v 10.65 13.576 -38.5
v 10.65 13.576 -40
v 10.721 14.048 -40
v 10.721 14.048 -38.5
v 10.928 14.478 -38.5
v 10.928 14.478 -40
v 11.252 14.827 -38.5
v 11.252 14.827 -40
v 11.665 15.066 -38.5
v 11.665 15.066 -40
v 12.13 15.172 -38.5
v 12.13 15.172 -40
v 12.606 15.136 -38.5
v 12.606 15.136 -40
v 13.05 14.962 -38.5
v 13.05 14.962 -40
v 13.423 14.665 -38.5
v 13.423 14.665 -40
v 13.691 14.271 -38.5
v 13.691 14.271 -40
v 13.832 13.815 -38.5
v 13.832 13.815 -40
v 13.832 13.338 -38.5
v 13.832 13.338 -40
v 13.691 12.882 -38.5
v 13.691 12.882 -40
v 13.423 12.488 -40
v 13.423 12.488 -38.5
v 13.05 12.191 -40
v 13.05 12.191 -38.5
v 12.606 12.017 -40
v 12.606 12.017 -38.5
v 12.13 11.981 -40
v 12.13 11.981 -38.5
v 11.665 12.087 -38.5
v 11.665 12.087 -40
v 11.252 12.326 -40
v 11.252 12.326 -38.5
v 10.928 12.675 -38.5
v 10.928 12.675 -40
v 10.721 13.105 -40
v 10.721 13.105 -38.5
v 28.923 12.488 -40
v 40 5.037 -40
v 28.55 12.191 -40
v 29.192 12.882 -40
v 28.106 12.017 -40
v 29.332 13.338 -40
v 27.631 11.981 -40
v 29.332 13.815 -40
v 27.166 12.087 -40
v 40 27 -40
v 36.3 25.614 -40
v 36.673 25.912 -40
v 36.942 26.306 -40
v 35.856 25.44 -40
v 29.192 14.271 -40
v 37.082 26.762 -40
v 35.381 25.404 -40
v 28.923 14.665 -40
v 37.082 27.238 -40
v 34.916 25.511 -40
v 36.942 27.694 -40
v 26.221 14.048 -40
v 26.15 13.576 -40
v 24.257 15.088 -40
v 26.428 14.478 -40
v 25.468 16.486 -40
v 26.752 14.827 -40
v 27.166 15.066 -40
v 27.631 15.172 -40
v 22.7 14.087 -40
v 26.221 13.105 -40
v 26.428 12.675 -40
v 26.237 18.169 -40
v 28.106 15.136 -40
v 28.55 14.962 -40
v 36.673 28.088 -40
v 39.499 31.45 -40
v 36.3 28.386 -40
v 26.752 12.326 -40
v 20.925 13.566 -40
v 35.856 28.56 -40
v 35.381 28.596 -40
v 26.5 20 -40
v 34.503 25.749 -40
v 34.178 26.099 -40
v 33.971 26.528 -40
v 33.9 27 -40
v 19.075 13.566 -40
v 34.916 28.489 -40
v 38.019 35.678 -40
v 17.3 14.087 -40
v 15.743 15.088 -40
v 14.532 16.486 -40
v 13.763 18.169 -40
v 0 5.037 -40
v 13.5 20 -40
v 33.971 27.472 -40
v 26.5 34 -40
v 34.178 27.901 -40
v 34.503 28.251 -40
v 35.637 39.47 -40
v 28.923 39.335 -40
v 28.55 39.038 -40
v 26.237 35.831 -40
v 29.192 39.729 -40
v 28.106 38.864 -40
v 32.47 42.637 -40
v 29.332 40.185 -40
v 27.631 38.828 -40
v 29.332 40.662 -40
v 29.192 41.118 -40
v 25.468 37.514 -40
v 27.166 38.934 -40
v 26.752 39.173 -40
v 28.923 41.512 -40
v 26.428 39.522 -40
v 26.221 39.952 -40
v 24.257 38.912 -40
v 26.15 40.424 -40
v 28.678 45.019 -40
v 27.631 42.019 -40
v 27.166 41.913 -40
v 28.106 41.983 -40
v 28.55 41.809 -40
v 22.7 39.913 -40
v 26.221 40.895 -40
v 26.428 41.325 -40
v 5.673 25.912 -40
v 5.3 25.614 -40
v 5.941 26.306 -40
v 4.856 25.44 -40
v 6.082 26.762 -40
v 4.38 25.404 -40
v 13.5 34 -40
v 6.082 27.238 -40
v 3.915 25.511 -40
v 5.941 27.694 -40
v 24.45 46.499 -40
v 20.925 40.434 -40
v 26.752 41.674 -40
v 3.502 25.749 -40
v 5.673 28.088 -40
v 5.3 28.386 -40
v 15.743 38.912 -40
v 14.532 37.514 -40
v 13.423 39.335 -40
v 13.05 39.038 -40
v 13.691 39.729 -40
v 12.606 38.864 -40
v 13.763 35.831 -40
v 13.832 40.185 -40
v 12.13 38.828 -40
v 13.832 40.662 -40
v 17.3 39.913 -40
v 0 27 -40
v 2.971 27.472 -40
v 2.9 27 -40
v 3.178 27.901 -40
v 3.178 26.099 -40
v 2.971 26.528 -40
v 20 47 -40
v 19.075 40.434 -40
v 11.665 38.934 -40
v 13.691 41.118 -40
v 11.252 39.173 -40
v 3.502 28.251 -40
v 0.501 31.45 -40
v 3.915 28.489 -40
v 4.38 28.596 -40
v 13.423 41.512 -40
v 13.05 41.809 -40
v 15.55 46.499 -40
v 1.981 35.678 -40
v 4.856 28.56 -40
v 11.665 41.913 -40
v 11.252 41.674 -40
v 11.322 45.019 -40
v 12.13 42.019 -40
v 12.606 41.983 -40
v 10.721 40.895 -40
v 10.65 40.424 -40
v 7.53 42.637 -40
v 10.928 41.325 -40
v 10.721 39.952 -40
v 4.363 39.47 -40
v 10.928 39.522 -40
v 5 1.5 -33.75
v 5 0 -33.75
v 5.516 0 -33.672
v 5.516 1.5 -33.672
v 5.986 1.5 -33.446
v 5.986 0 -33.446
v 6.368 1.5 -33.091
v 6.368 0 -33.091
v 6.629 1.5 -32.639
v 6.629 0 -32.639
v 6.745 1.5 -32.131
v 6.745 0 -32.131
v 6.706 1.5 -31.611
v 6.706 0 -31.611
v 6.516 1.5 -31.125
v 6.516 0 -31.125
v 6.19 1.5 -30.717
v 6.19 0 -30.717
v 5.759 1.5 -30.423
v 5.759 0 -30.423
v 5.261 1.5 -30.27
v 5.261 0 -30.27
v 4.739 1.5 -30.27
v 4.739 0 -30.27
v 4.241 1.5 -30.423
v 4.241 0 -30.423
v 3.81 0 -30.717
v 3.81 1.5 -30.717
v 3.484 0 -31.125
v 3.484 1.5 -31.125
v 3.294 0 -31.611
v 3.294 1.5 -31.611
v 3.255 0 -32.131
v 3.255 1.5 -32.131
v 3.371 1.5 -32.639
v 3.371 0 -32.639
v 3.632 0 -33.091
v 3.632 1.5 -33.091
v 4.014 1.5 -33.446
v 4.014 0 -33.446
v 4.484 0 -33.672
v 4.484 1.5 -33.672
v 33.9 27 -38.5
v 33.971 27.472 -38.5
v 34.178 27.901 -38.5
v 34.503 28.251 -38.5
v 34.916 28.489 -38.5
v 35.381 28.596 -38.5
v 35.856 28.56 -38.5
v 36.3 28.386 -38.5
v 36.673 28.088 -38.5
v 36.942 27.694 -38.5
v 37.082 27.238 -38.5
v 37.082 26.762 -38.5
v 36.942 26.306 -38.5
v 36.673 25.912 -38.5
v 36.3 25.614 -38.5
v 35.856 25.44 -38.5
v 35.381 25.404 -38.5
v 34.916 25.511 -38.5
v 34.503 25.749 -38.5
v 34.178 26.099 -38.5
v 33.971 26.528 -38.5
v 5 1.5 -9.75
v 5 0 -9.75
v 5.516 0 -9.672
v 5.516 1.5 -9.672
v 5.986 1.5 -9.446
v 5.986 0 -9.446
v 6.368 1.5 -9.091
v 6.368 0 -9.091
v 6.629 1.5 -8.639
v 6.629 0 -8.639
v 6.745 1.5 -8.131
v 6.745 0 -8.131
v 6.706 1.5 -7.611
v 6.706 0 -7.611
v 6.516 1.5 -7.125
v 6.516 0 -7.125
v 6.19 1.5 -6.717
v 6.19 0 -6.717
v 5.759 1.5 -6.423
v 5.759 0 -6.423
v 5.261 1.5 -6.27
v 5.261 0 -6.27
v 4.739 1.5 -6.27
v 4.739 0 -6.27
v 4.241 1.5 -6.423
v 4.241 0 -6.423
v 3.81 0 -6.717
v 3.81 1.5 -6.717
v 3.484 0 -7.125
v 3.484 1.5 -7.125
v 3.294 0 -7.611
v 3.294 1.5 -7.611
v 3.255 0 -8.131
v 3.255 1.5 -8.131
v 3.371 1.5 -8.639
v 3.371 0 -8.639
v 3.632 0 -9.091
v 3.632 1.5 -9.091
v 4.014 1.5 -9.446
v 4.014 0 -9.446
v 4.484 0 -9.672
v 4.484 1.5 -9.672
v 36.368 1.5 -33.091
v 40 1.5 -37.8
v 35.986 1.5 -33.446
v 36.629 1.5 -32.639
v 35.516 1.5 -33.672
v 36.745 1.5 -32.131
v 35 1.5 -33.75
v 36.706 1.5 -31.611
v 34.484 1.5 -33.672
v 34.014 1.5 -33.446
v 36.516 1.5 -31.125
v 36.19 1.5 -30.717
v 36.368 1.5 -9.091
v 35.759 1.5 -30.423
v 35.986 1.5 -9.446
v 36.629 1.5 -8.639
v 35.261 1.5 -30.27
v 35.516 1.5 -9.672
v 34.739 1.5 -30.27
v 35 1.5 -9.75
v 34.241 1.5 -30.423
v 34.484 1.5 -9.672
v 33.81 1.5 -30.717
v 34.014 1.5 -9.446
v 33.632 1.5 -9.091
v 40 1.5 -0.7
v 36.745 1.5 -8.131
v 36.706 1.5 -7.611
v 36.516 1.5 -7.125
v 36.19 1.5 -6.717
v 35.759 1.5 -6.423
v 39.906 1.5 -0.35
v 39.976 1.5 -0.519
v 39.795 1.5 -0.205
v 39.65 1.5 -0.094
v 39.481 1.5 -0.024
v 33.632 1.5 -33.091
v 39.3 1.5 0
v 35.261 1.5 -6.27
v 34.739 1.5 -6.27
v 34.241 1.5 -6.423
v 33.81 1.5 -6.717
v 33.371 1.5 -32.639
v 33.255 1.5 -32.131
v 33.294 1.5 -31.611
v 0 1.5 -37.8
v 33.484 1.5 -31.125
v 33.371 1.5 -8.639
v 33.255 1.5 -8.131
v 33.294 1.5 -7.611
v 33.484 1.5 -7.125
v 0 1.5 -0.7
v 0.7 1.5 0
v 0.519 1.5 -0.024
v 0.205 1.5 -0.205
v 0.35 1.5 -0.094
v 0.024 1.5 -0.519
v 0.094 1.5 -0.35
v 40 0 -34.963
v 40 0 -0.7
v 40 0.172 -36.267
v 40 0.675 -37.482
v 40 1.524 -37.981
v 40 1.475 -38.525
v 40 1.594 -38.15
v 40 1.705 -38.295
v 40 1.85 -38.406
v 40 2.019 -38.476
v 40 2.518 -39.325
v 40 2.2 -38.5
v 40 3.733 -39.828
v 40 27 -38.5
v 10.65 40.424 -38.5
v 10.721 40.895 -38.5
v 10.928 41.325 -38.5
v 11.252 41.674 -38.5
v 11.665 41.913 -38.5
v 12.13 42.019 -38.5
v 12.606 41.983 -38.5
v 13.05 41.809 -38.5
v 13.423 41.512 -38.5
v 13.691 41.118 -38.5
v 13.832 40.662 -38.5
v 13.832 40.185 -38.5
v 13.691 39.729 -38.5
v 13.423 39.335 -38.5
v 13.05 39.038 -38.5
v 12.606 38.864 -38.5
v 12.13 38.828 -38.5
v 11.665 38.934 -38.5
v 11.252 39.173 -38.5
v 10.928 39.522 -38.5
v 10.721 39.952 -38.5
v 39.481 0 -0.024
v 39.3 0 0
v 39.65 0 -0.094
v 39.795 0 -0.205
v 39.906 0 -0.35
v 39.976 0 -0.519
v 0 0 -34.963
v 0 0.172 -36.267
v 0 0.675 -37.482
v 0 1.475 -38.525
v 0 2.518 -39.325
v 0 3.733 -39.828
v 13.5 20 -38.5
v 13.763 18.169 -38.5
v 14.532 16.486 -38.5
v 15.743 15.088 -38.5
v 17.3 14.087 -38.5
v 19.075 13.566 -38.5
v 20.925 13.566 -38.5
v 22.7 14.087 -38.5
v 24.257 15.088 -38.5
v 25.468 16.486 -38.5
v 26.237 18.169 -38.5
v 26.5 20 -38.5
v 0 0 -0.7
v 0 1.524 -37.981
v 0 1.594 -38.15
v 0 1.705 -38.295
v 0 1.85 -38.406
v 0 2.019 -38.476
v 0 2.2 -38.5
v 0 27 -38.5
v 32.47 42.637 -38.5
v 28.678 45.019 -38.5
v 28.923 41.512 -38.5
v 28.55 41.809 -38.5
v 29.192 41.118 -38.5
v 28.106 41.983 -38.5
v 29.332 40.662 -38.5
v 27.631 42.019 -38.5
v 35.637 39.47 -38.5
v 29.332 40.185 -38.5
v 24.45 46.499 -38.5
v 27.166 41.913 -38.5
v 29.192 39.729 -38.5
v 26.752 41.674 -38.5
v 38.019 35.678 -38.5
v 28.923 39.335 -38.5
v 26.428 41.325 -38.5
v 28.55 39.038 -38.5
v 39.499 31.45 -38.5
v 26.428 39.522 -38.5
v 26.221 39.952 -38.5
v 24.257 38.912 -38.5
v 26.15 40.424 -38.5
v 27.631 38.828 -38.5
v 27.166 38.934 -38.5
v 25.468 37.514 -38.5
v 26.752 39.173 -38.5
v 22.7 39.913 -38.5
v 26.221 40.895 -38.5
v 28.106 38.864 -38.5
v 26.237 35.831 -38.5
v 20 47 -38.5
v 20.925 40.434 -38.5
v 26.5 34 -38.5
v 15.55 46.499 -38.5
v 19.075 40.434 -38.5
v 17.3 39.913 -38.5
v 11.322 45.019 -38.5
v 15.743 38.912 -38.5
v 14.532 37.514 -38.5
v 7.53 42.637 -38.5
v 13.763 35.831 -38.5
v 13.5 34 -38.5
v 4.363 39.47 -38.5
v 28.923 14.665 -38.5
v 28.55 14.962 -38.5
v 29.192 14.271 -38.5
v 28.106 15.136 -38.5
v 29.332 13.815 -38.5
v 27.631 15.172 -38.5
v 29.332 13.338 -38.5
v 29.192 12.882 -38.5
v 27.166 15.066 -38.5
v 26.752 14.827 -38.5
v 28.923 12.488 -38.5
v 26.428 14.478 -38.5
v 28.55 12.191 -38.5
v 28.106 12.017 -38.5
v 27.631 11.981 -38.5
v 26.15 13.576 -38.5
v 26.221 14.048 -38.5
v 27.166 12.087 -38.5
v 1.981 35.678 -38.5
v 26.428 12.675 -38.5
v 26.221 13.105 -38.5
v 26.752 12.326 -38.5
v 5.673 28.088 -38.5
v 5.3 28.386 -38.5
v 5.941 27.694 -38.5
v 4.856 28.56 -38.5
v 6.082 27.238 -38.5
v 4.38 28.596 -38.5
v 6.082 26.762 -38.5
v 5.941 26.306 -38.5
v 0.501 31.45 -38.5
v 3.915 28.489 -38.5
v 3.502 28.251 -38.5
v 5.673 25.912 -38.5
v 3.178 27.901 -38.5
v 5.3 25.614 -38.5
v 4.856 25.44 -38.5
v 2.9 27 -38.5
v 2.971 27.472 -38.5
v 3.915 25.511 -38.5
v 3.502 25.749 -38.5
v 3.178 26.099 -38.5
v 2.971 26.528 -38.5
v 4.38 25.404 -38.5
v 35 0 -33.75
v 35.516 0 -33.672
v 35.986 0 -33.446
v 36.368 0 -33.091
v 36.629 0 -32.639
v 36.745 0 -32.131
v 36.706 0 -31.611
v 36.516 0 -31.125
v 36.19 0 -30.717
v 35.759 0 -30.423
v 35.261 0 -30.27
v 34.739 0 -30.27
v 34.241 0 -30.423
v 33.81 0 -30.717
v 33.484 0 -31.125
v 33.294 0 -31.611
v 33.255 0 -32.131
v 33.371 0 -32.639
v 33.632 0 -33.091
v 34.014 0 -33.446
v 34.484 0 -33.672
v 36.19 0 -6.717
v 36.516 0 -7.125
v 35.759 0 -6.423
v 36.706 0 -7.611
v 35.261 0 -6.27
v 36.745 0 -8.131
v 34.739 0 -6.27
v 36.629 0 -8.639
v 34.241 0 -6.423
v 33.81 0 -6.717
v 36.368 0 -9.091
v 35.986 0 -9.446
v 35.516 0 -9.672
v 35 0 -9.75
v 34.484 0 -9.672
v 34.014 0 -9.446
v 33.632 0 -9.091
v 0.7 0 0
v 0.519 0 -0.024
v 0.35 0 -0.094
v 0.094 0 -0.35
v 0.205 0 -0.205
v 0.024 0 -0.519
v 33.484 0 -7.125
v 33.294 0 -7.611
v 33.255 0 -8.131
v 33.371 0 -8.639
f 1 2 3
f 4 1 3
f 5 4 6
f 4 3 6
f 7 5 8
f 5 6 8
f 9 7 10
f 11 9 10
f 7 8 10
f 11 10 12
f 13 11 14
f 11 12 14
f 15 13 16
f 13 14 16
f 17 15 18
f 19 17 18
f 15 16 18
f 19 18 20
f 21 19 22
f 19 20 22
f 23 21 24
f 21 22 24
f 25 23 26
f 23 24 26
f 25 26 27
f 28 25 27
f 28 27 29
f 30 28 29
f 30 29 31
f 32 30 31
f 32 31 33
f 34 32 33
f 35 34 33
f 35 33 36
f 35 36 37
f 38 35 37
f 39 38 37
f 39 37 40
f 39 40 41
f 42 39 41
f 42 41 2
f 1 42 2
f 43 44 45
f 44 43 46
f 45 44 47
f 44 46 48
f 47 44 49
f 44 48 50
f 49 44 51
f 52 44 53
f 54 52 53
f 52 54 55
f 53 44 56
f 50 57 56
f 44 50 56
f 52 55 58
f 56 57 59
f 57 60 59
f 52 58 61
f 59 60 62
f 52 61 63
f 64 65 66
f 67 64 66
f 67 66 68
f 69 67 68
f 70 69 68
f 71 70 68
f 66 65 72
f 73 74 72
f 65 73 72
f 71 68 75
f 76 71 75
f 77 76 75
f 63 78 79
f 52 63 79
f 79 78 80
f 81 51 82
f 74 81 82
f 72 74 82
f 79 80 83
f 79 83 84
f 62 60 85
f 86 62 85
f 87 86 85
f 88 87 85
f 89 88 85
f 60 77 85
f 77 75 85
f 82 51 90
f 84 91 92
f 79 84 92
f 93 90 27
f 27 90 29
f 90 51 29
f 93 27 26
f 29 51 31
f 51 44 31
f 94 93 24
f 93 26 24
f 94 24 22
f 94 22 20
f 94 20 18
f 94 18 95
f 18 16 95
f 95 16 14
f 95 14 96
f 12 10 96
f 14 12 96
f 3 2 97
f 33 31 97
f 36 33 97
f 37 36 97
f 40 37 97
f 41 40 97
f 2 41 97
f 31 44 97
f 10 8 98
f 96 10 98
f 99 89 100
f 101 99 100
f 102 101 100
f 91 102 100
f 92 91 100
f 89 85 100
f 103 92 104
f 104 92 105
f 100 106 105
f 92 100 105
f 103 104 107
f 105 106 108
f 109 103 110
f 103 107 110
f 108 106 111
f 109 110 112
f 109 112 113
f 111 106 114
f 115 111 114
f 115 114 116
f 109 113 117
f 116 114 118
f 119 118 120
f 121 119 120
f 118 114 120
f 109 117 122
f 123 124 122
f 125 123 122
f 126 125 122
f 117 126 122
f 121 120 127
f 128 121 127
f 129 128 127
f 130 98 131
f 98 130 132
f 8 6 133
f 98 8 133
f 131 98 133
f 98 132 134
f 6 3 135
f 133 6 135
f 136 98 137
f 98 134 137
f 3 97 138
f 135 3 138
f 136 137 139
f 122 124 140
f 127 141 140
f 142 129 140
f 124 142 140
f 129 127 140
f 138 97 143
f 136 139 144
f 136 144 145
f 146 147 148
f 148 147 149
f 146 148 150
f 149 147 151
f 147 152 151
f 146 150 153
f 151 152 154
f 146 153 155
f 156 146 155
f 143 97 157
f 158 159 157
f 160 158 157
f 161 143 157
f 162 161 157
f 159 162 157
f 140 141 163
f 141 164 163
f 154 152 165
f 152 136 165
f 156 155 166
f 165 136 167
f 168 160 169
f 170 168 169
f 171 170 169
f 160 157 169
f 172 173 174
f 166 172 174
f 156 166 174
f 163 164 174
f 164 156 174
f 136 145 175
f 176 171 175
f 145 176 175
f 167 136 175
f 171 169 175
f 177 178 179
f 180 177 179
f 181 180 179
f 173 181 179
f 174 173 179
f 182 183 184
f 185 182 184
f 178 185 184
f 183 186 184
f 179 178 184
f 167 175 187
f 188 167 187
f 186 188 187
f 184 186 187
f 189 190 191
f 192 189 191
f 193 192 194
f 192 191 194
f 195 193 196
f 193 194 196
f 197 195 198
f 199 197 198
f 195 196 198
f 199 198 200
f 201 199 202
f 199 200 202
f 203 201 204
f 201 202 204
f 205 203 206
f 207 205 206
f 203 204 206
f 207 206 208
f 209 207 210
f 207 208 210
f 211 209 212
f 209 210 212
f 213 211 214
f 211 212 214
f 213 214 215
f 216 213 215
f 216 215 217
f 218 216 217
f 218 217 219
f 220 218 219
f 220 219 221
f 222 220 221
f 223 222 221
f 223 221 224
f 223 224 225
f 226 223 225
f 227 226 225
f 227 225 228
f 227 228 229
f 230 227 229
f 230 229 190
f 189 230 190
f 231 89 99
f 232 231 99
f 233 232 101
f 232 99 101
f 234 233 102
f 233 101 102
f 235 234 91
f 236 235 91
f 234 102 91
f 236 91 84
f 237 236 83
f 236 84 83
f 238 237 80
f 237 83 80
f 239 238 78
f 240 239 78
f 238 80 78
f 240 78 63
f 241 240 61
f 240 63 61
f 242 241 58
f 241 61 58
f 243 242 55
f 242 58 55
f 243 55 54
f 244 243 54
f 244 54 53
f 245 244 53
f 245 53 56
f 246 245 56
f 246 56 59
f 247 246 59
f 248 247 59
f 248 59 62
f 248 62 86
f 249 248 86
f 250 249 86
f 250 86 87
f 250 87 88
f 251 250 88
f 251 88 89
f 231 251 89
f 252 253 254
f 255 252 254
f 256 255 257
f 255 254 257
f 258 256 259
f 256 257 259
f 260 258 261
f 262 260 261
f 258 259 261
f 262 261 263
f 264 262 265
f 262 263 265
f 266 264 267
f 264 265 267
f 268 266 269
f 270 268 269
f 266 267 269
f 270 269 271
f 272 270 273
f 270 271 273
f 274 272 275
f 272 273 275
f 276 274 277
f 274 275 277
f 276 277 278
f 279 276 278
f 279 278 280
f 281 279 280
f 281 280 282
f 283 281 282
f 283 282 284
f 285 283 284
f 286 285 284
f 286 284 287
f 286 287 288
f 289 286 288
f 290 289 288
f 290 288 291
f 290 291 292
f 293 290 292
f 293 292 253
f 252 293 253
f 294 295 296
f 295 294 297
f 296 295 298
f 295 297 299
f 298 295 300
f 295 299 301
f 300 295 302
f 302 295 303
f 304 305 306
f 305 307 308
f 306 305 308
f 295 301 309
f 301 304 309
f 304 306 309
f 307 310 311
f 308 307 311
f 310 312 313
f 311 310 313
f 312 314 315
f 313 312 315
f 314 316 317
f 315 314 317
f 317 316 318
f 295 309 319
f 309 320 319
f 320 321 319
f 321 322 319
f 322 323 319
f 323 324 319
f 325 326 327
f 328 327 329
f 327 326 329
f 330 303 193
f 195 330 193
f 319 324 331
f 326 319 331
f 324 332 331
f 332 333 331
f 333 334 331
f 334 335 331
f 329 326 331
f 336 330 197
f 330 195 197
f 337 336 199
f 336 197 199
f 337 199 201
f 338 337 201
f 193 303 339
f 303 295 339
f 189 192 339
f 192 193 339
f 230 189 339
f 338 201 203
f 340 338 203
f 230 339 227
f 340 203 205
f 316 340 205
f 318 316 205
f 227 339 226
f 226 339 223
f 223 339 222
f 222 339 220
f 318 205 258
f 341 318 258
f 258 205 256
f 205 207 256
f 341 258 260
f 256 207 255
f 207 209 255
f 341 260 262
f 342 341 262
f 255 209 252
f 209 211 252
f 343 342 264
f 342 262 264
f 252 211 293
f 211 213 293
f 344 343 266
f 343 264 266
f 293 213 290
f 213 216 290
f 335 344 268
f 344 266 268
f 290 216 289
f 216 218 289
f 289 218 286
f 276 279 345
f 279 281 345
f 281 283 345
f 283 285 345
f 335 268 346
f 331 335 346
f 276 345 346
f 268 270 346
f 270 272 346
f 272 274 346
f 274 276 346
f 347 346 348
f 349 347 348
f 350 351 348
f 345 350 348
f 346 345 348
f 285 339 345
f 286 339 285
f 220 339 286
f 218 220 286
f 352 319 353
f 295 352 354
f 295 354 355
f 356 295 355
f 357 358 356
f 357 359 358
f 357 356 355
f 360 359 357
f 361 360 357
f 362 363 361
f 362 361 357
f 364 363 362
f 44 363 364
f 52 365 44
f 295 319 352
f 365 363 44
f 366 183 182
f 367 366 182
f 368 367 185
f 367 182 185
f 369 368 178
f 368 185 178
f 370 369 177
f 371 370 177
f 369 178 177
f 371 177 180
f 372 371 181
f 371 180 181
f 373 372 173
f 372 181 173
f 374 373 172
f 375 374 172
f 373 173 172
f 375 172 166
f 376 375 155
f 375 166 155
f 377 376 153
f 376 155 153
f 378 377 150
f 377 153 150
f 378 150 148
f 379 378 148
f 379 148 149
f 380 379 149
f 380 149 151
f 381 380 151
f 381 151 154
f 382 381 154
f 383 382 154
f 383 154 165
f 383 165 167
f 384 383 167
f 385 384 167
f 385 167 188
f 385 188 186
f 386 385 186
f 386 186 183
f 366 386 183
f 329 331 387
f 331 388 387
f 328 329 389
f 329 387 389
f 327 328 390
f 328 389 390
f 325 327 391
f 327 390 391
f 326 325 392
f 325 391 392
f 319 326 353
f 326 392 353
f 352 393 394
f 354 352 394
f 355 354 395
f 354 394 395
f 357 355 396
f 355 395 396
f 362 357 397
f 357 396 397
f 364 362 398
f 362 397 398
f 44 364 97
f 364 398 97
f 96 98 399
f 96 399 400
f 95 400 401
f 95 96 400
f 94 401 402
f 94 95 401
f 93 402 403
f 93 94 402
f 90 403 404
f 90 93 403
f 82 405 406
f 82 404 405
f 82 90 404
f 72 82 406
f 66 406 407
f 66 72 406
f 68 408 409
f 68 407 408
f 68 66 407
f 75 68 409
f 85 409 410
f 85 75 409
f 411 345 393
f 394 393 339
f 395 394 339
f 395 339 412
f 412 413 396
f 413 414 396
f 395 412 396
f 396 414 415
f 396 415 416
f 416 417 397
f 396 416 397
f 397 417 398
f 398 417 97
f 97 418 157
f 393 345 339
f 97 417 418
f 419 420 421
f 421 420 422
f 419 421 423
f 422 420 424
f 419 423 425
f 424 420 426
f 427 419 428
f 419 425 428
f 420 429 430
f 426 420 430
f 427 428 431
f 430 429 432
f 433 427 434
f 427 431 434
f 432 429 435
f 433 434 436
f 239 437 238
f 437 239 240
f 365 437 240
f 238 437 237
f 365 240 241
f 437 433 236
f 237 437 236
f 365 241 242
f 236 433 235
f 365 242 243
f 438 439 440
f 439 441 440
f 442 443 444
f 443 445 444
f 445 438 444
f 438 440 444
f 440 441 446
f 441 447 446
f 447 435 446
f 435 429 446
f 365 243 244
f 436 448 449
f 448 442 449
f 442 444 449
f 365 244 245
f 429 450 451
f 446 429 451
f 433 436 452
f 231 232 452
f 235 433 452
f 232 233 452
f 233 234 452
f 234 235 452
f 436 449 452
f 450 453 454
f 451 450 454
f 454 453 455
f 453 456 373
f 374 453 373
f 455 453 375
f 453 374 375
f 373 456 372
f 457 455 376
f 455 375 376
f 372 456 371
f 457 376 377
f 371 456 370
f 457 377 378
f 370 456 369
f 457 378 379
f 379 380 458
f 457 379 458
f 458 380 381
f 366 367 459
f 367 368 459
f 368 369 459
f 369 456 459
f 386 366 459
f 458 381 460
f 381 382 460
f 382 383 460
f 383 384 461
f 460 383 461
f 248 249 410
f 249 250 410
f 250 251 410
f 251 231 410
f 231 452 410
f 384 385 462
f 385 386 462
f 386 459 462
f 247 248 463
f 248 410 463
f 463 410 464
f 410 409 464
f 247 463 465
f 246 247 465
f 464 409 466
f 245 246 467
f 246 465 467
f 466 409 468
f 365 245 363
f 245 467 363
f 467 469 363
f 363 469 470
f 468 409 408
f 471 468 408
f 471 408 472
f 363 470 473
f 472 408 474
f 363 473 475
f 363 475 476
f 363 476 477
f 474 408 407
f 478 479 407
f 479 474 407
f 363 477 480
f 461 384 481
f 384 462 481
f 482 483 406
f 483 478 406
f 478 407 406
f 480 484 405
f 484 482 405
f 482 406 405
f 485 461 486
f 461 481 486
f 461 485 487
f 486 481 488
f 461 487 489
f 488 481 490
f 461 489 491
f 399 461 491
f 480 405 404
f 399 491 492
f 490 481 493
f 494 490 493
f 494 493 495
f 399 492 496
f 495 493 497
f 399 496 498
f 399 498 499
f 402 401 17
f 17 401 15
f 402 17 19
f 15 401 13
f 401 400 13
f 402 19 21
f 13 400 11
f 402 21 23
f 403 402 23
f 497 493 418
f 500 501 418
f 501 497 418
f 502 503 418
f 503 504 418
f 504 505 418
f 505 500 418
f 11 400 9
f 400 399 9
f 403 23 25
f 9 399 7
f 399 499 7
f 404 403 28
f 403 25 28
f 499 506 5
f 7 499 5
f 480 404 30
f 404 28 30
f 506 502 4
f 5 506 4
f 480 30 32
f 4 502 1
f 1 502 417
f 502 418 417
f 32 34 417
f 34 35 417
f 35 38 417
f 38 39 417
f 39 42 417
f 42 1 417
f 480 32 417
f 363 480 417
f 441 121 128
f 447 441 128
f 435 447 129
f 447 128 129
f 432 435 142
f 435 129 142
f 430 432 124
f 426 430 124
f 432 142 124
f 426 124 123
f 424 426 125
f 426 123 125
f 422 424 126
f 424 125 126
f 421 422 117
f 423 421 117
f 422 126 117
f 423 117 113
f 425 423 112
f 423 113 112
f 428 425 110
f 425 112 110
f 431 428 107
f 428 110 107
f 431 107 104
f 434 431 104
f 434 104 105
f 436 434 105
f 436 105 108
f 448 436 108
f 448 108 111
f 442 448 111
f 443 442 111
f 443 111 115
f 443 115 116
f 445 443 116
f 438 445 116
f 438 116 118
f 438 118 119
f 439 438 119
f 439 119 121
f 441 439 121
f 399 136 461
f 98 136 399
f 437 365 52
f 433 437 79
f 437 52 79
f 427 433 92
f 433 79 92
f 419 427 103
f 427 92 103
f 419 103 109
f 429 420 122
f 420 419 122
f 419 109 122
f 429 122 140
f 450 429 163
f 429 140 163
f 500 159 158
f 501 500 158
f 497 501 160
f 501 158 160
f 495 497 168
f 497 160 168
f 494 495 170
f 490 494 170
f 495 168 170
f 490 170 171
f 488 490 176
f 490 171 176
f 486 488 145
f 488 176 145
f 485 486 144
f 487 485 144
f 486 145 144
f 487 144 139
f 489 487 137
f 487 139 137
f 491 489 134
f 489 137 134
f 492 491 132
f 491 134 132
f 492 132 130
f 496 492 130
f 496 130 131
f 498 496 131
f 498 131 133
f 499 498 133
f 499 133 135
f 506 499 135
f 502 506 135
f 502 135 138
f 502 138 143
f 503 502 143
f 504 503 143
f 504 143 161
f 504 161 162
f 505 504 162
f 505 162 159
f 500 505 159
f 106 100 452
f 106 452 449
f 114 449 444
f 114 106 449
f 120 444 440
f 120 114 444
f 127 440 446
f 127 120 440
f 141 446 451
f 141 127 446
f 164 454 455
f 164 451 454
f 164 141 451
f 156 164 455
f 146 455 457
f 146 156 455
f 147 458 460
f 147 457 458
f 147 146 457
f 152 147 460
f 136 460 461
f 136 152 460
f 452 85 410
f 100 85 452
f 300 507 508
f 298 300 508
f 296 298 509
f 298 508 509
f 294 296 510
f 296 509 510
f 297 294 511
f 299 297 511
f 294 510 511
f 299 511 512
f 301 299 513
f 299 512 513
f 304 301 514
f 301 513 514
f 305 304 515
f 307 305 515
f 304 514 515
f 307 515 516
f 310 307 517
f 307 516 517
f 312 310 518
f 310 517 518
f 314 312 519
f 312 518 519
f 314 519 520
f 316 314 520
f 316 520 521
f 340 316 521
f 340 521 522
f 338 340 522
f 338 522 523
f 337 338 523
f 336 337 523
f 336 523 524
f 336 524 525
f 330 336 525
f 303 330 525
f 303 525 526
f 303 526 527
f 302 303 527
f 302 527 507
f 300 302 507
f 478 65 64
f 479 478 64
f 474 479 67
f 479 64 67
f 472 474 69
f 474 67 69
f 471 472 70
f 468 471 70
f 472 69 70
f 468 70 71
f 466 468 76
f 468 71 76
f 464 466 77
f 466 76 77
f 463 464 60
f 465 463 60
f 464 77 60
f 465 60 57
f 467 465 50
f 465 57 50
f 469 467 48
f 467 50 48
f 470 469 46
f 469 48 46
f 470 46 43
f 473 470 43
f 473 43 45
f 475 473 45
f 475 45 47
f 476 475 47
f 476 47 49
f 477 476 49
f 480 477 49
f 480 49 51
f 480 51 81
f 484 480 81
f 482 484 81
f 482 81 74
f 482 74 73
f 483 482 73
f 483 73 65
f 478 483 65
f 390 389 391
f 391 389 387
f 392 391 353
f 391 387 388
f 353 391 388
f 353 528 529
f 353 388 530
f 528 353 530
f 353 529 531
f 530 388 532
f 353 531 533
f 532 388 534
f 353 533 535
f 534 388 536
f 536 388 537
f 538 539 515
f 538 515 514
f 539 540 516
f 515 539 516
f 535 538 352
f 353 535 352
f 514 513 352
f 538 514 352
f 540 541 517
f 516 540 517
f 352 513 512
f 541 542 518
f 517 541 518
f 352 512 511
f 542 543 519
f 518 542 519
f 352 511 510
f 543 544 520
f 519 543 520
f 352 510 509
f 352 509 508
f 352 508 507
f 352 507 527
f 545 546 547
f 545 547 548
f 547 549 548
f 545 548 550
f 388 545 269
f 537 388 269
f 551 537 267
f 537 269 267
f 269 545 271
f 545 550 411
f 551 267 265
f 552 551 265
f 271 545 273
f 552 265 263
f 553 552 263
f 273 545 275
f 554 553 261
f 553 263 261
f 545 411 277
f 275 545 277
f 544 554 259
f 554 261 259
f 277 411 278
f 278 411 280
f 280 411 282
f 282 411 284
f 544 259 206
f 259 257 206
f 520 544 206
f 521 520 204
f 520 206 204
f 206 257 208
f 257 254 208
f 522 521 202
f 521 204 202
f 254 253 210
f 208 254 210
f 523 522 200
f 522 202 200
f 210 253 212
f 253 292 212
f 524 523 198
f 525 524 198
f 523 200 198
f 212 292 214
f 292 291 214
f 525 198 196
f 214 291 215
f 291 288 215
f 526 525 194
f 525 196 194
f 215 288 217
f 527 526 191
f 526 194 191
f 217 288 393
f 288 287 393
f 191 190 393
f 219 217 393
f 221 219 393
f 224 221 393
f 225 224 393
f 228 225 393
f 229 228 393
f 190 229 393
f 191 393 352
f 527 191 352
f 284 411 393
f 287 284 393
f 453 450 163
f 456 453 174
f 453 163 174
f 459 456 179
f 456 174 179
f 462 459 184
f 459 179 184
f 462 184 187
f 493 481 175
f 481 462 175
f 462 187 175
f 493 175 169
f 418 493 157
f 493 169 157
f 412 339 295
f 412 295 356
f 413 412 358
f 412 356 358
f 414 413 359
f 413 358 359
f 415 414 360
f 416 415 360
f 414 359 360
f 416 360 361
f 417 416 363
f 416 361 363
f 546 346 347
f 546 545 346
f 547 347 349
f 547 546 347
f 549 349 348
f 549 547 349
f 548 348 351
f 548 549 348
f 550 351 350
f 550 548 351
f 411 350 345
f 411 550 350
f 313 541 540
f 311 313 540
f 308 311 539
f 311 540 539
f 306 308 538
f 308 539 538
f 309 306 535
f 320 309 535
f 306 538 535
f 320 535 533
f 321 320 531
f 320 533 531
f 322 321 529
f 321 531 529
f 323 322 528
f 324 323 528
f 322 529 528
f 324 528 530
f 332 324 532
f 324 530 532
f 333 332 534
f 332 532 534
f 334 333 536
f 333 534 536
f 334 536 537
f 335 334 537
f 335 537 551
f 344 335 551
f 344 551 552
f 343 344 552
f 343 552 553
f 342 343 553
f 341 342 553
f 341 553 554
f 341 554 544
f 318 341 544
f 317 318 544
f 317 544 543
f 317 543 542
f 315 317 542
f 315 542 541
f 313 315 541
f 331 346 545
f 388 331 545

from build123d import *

# Parameters (mm, degrees)
MAINPIECE_DEPTH       = 40
CHASSISHOLES_REACH    = 75.546
SKETCH2_R             = 1.75
DOME_REACH            = 75.546
WHEELMOTORGUIDE_REACH = 75.546
SKETCH4_R             = 1.6
FILLET1_R             = 0.7


with BuildPart() as part:
    # Sketch1 → MainPiece (new body)
    with BuildSketch(Plane(origin=(0, 0, 0), x_dir=(0, 0, -1), z_dir=(1, 0, 0))):
        with BuildLine():
            Line((0, 1.5), (0, 0))
            Line((0, 0), (34.963274192, 0))
            ThreePointArc((34.963274192, 0), (38.524777166, 1.475222834), (40, 5.036725808))
            Line((40, 5.036725808), (40, 47))
            Line((40, 47), (38.5, 47))
            Line((38.5, 47), (38.5, 1.5))
            Line((38.5, 1.5), (0, 1.5))
        make_face()
    extrude(amount=MAINPIECE_DEPTH)

    # Sketch2 → ChassisHoles (cut, up to next)
    with BuildSketch(Plane(origin=(0, 0, 0), x_dir=(-1, 0, 0), z_dir=(0, -1, 0)), mode=Mode.PRIVATE) as chassisholes_sk1:
        with Locations(Location((-5, 8, 0), (0, 0, 90))):
            Circle(SKETCH2_R)
    chassisholes_tool1 = extrude(chassisholes_sk1.sketch, amount=-CHASSISHOLES_REACH, mode=Mode.PRIVATE) & part.part
    # Sketch2 → ChassisHoles (cut, up to next)
    with BuildSketch(Plane(origin=(0, 0, 0), x_dir=(-1, 0, 0), z_dir=(0, -1, 0)), mode=Mode.PRIVATE) as chassisholes_sk2:
        with Locations(Location((-35, 8, 0), (0, 0, 90))):
            Circle(SKETCH2_R)
    chassisholes_tool2 = extrude(chassisholes_sk2.sketch, amount=-CHASSISHOLES_REACH, mode=Mode.PRIVATE) & part.part
    # Sketch2 → ChassisHoles (cut, up to next)
    with BuildSketch(Plane(origin=(0, 0, 0), x_dir=(-1, 0, 0), z_dir=(0, -1, 0)), mode=Mode.PRIVATE) as chassisholes_sk3:
        with Locations(Location((-35, 32, 0), (0, 0, 90))):
            Circle(SKETCH2_R)
    chassisholes_tool3 = extrude(chassisholes_sk3.sketch, amount=-CHASSISHOLES_REACH, mode=Mode.PRIVATE) & part.part
    # Sketch2 → ChassisHoles (cut, up to next)
    with BuildSketch(Plane(origin=(0, 0, 0), x_dir=(-1, 0, 0), z_dir=(0, -1, 0)), mode=Mode.PRIVATE) as chassisholes_sk4:
        with Locations(Location((-5, 32, 0), (0, 0, 90))):
            Circle(SKETCH2_R)
    chassisholes_tool4 = extrude(chassisholes_sk4.sketch, amount=-CHASSISHOLES_REACH, mode=Mode.PRIVATE) & part.part
    add(chassisholes_tool1.solids().sort_by_distance((5, 0, -8))[0], mode=Mode.SUBTRACT)
    add(chassisholes_tool2.solids().sort_by_distance((35, 0, -8))[0], mode=Mode.SUBTRACT)
    add(chassisholes_tool3.solids().sort_by_distance((35, 0, -32))[0], mode=Mode.SUBTRACT)
    add(chassisholes_tool4.solids().sort_by_distance((5, 0, -32))[0], mode=Mode.SUBTRACT)

    # Sketch3 → Dome (cut, up to next)
    with BuildSketch(Plane(origin=(0, 0, -40), x_dir=(-1, 0, 0), z_dir=(0, 0, -1)), mode=Mode.PRIVATE) as dome_sk1:
        with BuildLine():
            Line((-40, 47), (-40, 27))
            ThreePointArc((-40, 27), (-34.142135624, 41.142135624), (-20, 47))
            Line((-20, 47), (-40, 47))
        make_face()
    dome_tool1 = extrude(dome_sk1.sketch, amount=-DOME_REACH, mode=Mode.PRIVATE) & part.part
    # Sketch3 → Dome (cut, up to next)
    with BuildSketch(Plane(origin=(0, 0, -40), x_dir=(-1, 0, 0), z_dir=(0, 0, -1)), mode=Mode.PRIVATE) as dome_sk2:
        with BuildLine():
            Line((0, 47), (-20, 47))
            ThreePointArc((-20, 47), (-5.857864376, 41.142135624), (0, 27))
            Line((0, 27), (0, 47))
        make_face()
    dome_tool2 = extrude(dome_sk2.sketch, amount=-DOME_REACH, mode=Mode.PRIVATE) & part.part
    add(dome_tool1.solids().sort_by_distance((35.532641, 42.532641, -40))[0], mode=Mode.SUBTRACT)
    add(dome_tool2.solids().sort_by_distance((4.467359, 42.532641, -40))[0], mode=Mode.SUBTRACT)

    # Sketch4 → WheelMotorGuide (cut, up to next)
    with BuildSketch(Plane(origin=(0, 0, -40), x_dir=(-1, 0, 0), z_dir=(0, 0, -1)), mode=Mode.PRIVATE) as wheelmotorguide_sk1:
        with Locations((-35.500160217, 27)):
            Circle(SKETCH4_R)
    wheelmotorguide_tool1 = extrude(wheelmotorguide_sk1.sketch, amount=-WHEELMOTORGUIDE_REACH, mode=Mode.PRIVATE) & part.part
    # Sketch4 → WheelMotorGuide (cut, up to next)
    with BuildSketch(Plane(origin=(0, 0, -40), x_dir=(-1, 0, 0), z_dir=(0, 0, -1)), mode=Mode.PRIVATE) as wheelmotorguide_sk2:
        with Locations((-27.750080108, 40.42353251)):
            Circle(SKETCH4_R)
    wheelmotorguide_tool2 = extrude(wheelmotorguide_sk2.sketch, amount=-WHEELMOTORGUIDE_REACH, mode=Mode.PRIVATE) & part.part
    # Sketch4 → WheelMotorGuide (cut, up to next)
    with BuildSketch(Plane(origin=(0, 0, -40), x_dir=(-1, 0, 0), z_dir=(0, 0, -1)), mode=Mode.PRIVATE) as wheelmotorguide_sk3:
        with Locations((-12.249919892, 40.42353251)):
            Circle(SKETCH4_R)
    wheelmotorguide_tool3 = extrude(wheelmotorguide_sk3.sketch, amount=-WHEELMOTORGUIDE_REACH, mode=Mode.PRIVATE) & part.part
    # Sketch4 → WheelMotorGuide (cut, up to next)
    with BuildSketch(Plane(origin=(0, 0, -40), x_dir=(-1, 0, 0), z_dir=(0, 0, -1)), mode=Mode.PRIVATE) as wheelmotorguide_sk4:
        with Locations((-4.499839783, 27)):
            Circle(SKETCH4_R)
    wheelmotorguide_tool4 = extrude(wheelmotorguide_sk4.sketch, amount=-WHEELMOTORGUIDE_REACH, mode=Mode.PRIVATE) & part.part
    # Sketch4 → WheelMotorGuide (cut, up to next)
    with BuildSketch(Plane(origin=(0, 0, -40), x_dir=(-1, 0, 0), z_dir=(0, 0, -1)), mode=Mode.PRIVATE) as wheelmotorguide_sk5:
        with Locations((-12.249919892, 13.57646749)):
            Circle(SKETCH4_R)
    wheelmotorguide_tool5 = extrude(wheelmotorguide_sk5.sketch, amount=-WHEELMOTORGUIDE_REACH, mode=Mode.PRIVATE) & part.part
    # Sketch4 → WheelMotorGuide (cut, up to next)
    with BuildSketch(Plane(origin=(0, 0, -40), x_dir=(-1, 0, 0), z_dir=(0, 0, -1)), mode=Mode.PRIVATE) as wheelmotorguide_sk6:
        with Locations((-27.750080108, 13.57646749)):
            Circle(SKETCH4_R)
    wheelmotorguide_tool6 = extrude(wheelmotorguide_sk6.sketch, amount=-WHEELMOTORGUIDE_REACH, mode=Mode.PRIVATE) & part.part
    # Sketch4 → WheelMotorGuide (cut, up to next)
    with BuildSketch(Plane(origin=(0, 0, -40), x_dir=(-1, 0, 0), z_dir=(0, 0, -1)), mode=Mode.PRIVATE) as wheelmotorguide_sk7:
        with BuildLine():
            Line((-26.5, 20), (-26.5, 34))
            ThreePointArc((-26.5, 34), (-20, 40.5), (-13.5, 34))
            Line((-13.5, 34), (-13.5, 20))
            ThreePointArc((-13.5, 20), (-20, 13.5), (-26.5, 20))
        make_face()
    wheelmotorguide_tool7 = extrude(wheelmotorguide_sk7.sketch, amount=-WHEELMOTORGUIDE_REACH, mode=Mode.PRIVATE) & part.part
    add(wheelmotorguide_tool1.solids().sort_by_distance((35.50016, 27, -40))[0], mode=Mode.SUBTRACT)
    add(wheelmotorguide_tool2.solids().sort_by_distance((27.75008, 40.423533, -40))[0], mode=Mode.SUBTRACT)
    add(wheelmotorguide_tool3.solids().sort_by_distance((12.24992, 40.423533, -40))[0], mode=Mode.SUBTRACT)
    add(wheelmotorguide_tool4.solids().sort_by_distance((4.49984, 27, -40))[0], mode=Mode.SUBTRACT)
    add(wheelmotorguide_tool5.solids().sort_by_distance((12.24992, 13.576467, -40))[0], mode=Mode.SUBTRACT)
    add(wheelmotorguide_tool6.solids().sort_by_distance((27.75008, 13.576467, -40))[0], mode=Mode.SUBTRACT)
    add(wheelmotorguide_tool7.solids().sort_by_distance((20, 27, -40))[0], mode=Mode.SUBTRACT)

    # Fillet1
    fillet1_edges = [part.edges().sort_by_distance(p)[0] for p in [
        (20, 1.5, -38.5),
        (40, 0.75, 0),
        (0, 0.75, 0),
    ]]
    fillet(fillet1_edges, radius=FILLET1_R)


solid = part.part
